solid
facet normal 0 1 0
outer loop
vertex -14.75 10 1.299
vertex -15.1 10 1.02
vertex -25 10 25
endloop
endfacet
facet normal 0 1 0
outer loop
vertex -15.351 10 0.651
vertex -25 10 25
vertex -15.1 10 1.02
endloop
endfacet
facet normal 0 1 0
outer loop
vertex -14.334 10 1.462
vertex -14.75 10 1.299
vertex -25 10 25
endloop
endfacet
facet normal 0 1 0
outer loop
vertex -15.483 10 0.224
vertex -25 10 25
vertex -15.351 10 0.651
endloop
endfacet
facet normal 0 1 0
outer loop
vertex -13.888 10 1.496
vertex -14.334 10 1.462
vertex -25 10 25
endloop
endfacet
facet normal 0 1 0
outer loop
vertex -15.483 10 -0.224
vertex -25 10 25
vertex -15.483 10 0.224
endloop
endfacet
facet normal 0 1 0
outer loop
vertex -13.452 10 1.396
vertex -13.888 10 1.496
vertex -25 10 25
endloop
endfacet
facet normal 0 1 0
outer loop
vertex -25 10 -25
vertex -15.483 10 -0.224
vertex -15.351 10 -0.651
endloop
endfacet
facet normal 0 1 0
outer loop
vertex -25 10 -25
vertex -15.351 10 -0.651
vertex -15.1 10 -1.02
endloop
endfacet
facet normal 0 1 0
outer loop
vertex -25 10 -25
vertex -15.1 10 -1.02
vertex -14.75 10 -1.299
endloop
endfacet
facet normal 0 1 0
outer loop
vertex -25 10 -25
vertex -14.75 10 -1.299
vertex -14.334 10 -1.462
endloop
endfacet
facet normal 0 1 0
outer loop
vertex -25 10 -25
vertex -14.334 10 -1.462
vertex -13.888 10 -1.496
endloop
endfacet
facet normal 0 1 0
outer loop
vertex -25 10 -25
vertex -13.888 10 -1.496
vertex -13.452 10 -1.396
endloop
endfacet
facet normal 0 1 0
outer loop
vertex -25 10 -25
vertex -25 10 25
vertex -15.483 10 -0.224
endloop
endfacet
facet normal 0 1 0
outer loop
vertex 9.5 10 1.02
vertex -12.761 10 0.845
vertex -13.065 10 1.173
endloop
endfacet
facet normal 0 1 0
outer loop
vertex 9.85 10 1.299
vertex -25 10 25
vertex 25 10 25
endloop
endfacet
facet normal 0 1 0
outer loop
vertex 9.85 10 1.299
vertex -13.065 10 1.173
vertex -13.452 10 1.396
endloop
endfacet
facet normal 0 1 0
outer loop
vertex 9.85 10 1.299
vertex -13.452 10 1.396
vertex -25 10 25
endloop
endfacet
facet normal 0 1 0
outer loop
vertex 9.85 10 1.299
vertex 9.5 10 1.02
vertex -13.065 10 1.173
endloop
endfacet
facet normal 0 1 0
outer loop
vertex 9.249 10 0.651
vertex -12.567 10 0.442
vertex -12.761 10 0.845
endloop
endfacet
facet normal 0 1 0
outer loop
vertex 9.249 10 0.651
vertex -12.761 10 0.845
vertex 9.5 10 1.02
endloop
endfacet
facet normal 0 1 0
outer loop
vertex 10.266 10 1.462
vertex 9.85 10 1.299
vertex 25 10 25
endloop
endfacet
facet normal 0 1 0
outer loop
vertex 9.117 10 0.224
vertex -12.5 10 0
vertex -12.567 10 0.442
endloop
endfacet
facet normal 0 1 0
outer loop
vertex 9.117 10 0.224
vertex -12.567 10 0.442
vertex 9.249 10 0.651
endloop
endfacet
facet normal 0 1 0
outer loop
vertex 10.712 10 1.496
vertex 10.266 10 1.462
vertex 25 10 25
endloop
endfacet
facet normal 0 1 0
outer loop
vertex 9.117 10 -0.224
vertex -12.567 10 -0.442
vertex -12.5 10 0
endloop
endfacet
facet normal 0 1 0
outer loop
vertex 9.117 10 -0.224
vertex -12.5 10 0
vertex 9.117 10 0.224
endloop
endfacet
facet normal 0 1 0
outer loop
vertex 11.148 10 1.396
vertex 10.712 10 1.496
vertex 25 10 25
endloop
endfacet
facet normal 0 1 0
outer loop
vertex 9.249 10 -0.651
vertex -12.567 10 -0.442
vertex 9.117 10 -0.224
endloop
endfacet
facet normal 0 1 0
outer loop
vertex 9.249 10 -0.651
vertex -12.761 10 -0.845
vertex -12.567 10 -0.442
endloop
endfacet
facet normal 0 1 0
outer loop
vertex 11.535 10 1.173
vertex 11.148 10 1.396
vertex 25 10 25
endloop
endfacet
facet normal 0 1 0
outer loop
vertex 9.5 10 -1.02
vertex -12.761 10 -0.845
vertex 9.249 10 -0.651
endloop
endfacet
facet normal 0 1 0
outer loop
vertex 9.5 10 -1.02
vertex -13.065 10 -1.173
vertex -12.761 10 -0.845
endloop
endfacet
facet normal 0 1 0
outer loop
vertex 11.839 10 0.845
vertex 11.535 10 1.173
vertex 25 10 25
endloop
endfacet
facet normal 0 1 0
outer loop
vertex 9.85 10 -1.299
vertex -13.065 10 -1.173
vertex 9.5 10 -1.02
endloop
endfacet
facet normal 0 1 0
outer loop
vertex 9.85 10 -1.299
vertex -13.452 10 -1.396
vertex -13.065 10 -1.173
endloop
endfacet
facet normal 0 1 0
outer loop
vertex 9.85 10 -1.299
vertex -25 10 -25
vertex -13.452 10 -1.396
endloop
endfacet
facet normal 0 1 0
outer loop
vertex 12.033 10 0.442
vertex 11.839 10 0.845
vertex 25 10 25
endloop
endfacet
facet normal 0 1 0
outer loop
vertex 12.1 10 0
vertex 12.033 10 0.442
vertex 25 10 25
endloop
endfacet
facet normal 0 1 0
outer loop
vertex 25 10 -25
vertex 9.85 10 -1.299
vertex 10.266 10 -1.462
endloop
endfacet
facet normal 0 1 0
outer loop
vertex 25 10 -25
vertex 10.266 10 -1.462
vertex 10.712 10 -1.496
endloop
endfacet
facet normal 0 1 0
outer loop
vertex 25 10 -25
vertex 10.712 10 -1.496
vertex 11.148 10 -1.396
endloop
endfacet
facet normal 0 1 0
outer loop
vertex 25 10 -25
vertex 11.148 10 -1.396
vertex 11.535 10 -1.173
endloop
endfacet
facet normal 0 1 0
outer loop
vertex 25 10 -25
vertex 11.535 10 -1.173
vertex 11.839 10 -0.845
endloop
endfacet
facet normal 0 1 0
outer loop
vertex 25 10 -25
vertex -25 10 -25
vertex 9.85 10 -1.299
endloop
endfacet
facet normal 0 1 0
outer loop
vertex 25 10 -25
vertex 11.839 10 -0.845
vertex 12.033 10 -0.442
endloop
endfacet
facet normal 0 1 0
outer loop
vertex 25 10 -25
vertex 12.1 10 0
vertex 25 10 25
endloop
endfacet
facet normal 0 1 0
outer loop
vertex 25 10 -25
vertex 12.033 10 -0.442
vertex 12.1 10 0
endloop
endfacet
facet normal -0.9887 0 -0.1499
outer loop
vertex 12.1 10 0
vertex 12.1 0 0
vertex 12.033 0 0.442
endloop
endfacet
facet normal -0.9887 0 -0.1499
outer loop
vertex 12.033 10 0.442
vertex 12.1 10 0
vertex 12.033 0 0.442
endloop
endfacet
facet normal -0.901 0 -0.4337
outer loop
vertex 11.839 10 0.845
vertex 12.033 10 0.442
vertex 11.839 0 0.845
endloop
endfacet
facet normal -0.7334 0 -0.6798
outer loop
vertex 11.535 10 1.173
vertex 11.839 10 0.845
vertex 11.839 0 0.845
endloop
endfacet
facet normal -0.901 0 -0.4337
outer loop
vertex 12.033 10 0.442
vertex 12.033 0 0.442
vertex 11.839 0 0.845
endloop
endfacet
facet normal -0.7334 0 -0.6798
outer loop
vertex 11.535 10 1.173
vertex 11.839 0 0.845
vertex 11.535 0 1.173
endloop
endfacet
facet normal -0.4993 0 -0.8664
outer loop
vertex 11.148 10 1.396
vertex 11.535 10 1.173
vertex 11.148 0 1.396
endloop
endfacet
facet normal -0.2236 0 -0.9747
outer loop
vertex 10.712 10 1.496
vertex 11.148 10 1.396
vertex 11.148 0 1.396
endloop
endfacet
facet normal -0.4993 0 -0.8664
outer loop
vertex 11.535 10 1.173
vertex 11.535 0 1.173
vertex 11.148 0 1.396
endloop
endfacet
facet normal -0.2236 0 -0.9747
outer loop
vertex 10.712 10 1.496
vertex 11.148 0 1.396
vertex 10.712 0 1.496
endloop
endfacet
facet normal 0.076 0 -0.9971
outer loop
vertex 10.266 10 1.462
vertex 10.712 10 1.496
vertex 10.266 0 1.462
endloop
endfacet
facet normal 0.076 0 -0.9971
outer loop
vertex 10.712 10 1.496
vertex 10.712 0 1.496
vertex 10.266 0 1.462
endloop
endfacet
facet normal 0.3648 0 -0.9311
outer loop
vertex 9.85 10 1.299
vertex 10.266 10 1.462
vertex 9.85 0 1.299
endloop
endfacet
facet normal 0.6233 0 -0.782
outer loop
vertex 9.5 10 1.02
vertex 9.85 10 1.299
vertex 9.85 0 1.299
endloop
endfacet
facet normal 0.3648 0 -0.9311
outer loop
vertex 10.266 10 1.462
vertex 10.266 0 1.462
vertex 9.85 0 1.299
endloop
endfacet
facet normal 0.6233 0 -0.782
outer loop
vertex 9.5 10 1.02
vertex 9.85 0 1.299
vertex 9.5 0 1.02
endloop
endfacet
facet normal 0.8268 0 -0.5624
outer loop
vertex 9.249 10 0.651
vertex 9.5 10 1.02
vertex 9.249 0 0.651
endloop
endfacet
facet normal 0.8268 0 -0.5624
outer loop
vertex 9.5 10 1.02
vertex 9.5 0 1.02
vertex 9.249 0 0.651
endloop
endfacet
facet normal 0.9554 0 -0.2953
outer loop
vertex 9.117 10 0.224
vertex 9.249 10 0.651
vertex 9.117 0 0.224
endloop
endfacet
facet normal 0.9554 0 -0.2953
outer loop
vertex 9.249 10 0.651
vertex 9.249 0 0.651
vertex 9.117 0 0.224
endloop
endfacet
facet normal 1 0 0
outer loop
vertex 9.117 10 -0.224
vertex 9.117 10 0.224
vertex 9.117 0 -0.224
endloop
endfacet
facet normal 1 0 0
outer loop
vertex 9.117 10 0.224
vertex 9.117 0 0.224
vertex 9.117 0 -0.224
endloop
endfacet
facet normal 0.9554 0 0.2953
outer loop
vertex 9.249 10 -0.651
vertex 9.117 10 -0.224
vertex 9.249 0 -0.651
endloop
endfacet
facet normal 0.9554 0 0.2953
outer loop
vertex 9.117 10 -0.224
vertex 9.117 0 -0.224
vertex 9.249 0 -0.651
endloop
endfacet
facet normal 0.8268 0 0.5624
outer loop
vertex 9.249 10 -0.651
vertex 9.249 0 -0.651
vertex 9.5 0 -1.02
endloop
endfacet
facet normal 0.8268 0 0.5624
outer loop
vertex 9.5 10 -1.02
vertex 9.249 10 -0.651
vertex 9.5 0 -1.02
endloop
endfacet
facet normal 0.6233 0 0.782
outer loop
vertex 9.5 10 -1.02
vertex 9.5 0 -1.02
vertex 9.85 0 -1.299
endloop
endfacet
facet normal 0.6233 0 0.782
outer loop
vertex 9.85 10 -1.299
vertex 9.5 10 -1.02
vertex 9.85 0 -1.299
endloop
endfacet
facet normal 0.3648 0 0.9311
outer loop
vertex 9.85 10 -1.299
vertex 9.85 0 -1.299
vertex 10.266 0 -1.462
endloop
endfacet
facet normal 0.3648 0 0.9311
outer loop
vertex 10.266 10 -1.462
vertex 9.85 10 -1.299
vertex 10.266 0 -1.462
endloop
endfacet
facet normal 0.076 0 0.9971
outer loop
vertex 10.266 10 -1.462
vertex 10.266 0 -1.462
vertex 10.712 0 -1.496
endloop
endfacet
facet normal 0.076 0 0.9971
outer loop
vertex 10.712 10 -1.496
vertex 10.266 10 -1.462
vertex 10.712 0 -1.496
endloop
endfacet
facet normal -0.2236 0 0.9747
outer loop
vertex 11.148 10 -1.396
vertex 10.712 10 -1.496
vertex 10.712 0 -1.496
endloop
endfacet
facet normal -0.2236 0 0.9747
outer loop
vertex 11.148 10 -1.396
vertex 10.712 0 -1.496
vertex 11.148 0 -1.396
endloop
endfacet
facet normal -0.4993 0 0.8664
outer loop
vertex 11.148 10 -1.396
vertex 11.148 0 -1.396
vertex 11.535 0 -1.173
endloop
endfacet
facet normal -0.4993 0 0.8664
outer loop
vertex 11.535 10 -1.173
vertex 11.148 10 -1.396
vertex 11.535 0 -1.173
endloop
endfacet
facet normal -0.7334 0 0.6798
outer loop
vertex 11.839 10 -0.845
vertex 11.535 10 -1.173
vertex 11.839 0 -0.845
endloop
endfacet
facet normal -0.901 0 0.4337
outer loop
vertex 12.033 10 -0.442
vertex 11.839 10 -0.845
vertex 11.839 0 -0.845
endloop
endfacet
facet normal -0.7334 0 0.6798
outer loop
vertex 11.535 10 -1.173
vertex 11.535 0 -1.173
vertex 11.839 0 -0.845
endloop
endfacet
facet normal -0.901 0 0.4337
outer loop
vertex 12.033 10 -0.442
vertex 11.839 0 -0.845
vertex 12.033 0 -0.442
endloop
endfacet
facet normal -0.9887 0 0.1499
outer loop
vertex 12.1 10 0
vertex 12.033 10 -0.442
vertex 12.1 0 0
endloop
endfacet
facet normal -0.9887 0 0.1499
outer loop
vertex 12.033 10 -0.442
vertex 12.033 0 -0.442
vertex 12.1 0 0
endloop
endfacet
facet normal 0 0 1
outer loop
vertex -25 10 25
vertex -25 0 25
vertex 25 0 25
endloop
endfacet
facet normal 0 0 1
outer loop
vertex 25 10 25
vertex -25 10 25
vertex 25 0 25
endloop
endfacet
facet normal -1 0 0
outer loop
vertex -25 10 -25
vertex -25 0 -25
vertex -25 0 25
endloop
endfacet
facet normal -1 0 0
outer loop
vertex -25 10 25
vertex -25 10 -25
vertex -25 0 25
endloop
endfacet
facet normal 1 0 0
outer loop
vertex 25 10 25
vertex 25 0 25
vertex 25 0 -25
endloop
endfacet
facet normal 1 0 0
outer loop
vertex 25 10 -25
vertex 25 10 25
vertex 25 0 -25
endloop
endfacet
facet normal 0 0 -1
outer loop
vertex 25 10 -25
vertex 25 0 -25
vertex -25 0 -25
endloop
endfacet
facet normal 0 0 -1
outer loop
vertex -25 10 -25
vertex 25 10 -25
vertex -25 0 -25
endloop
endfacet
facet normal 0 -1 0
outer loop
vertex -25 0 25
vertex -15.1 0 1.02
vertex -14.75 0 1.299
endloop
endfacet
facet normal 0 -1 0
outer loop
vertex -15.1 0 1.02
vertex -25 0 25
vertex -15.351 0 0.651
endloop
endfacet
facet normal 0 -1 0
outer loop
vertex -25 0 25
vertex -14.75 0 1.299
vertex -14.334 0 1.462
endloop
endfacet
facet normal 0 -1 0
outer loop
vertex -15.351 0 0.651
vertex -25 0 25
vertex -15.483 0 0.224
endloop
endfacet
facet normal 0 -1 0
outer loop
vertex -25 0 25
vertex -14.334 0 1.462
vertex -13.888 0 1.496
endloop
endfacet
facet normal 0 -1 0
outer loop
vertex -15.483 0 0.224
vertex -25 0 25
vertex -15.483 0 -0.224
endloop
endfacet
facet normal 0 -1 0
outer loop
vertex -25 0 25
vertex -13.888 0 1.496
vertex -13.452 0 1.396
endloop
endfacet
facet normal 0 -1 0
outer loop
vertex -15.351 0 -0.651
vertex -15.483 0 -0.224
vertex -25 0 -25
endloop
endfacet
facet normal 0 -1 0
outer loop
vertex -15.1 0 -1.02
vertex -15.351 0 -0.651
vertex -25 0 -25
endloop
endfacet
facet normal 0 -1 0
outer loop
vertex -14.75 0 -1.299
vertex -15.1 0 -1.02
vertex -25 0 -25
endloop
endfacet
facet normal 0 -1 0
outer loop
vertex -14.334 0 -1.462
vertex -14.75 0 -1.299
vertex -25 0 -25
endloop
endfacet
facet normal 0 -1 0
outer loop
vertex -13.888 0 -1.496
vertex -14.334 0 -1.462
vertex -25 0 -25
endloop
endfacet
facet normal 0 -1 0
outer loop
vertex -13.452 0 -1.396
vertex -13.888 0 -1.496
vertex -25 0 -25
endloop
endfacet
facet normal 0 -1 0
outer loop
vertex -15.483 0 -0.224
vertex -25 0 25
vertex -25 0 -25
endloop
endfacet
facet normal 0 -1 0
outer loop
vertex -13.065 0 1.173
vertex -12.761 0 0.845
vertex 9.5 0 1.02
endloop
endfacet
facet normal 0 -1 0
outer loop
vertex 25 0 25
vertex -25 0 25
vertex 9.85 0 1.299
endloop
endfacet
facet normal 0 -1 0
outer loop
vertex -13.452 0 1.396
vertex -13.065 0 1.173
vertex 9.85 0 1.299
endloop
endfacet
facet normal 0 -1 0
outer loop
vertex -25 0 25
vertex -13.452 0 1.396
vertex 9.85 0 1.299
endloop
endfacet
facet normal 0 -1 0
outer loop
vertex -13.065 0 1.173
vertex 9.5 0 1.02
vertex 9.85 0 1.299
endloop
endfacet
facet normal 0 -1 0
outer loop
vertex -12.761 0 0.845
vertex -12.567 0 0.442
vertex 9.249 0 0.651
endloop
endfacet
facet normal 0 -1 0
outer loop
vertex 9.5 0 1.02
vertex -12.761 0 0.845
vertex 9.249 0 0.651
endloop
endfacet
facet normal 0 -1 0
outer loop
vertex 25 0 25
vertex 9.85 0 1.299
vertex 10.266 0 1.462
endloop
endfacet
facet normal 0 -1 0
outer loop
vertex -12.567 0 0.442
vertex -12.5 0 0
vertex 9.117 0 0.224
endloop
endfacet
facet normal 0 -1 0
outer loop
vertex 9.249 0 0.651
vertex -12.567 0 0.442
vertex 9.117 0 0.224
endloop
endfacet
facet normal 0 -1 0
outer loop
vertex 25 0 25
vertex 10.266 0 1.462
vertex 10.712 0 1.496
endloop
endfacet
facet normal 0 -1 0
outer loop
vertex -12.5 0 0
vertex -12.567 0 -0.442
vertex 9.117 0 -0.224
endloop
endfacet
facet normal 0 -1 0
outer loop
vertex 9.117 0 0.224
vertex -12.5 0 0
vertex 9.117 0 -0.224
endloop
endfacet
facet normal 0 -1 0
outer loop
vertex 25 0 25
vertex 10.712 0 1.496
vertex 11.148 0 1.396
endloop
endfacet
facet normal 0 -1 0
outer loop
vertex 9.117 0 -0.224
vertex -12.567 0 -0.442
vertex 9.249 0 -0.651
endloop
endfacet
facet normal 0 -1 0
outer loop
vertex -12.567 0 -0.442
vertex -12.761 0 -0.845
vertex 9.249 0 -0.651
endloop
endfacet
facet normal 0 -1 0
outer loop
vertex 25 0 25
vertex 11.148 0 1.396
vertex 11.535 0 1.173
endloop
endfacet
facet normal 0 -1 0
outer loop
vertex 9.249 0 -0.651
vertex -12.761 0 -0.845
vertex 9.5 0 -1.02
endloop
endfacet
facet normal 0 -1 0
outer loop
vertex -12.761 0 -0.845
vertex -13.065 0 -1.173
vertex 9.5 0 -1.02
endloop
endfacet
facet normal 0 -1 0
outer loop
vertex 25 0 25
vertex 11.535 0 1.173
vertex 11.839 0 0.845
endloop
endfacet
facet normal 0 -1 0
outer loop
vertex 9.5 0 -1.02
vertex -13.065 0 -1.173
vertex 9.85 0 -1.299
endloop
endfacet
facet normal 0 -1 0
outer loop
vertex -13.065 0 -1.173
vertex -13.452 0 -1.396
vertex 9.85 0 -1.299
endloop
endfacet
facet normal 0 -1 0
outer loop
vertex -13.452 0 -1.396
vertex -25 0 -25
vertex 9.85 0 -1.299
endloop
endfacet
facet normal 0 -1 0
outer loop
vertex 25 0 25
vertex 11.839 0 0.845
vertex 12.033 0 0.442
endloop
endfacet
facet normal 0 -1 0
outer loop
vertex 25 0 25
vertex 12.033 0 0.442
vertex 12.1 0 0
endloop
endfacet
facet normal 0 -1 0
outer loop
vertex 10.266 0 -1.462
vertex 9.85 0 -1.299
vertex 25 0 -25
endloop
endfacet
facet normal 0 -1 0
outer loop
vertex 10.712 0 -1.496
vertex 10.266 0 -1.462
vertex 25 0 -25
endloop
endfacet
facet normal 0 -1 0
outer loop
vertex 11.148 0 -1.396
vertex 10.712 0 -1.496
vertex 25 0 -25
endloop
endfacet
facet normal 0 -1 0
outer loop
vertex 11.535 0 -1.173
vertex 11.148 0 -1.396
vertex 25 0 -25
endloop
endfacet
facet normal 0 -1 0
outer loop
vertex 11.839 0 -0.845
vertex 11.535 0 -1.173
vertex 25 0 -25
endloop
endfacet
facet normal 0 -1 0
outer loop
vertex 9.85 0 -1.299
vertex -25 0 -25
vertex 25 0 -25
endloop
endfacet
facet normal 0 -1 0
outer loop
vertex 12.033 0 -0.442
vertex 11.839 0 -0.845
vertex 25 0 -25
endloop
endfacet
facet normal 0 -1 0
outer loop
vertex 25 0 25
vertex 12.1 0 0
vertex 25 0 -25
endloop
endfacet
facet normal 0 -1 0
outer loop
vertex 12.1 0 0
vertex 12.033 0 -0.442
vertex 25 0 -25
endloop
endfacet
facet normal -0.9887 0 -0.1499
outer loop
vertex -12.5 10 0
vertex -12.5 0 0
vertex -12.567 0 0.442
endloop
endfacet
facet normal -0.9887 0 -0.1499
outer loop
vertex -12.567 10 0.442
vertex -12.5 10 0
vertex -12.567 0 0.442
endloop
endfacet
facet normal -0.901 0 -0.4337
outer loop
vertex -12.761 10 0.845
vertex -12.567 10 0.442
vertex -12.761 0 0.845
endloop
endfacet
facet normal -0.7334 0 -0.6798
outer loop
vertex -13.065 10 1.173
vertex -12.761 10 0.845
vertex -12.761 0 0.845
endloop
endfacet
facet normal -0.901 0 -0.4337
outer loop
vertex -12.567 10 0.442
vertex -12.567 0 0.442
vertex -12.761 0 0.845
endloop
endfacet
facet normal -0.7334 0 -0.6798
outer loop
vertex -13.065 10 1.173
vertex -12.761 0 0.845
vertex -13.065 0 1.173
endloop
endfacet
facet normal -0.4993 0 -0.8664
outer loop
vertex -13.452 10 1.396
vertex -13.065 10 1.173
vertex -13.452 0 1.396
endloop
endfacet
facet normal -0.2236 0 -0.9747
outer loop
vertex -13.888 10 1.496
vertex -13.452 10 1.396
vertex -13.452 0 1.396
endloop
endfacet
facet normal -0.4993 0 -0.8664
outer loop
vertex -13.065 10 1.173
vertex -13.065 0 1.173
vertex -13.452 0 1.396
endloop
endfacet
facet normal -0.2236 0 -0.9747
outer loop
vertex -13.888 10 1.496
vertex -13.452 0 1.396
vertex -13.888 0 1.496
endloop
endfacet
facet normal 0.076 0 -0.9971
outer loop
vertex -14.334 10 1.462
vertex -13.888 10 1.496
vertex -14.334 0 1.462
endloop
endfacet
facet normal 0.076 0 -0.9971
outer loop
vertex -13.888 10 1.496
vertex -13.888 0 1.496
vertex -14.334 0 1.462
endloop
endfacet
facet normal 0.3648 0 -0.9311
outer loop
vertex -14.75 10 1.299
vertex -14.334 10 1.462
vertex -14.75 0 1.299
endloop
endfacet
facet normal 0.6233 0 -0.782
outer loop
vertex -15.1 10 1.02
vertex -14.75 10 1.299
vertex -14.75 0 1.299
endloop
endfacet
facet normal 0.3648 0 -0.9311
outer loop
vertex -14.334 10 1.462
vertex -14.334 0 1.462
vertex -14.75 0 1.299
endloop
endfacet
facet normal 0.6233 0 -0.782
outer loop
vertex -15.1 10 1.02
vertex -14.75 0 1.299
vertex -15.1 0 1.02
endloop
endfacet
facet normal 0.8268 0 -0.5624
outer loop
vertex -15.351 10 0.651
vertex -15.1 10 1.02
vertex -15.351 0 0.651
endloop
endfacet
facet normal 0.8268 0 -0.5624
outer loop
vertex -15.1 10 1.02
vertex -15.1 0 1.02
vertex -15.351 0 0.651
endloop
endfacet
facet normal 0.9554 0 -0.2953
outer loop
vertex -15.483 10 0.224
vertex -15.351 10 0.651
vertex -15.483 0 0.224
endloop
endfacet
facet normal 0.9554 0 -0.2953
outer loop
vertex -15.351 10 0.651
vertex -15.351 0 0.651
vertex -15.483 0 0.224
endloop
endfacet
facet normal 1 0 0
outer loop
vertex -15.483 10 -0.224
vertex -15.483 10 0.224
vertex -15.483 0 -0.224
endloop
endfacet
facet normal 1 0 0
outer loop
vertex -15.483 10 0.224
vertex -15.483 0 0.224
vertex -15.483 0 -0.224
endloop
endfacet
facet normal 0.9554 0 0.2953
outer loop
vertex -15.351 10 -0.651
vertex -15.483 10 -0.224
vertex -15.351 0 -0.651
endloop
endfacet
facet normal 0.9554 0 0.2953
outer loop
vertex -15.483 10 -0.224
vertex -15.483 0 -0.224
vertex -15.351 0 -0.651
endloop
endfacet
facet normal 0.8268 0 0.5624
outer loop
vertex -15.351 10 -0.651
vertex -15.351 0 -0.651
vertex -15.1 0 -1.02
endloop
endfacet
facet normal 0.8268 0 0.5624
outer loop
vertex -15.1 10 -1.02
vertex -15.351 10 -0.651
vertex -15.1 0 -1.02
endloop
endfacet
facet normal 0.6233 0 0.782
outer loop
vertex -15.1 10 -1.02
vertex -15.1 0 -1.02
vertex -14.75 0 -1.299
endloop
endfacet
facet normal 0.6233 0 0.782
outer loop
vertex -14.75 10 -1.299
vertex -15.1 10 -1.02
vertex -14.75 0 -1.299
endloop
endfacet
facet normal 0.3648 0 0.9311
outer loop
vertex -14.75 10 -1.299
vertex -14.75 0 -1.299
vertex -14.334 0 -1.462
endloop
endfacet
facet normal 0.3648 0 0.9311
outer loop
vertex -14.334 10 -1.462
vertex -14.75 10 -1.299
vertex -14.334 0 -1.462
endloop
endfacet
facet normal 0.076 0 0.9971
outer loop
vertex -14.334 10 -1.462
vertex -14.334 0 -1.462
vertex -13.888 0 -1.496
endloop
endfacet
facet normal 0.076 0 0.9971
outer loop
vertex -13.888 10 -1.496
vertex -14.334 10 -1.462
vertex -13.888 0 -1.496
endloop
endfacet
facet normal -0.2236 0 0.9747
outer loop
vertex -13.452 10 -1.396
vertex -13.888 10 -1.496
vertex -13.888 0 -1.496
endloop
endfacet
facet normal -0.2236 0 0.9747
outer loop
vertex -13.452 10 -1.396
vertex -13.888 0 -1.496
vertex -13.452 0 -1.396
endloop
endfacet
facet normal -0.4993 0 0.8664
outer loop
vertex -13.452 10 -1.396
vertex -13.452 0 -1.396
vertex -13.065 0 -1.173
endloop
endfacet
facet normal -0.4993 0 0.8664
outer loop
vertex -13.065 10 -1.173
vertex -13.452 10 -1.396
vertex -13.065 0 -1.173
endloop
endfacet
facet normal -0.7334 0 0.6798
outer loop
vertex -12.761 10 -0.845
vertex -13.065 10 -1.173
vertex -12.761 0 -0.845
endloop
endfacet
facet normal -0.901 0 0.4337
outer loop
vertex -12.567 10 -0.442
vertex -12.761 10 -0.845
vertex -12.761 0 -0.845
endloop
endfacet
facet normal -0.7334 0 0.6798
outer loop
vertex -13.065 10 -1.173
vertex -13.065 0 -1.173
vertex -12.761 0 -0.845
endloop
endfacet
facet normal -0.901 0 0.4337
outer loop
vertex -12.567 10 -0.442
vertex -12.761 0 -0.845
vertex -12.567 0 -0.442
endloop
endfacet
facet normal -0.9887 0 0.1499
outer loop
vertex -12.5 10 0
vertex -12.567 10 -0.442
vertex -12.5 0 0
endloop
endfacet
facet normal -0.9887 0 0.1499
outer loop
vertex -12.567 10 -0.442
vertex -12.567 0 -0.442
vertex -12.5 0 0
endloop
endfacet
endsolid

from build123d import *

# Parameters (mm, degrees)
EXTRUDE_1_DEPTH = 10


with BuildPart() as part:
    # ｽｹｯﾁ1 → ﾎﾞｽ - 押し出し1 (new body)
    with BuildSketch(Plane(origin=(0, 0, 0), x_dir=(1, 0, 0), z_dir=(0, 1, 0))):
        with BuildLine():
            ThreePointArc((9.1, 0), (10.6, 1.5), (12.1, 0))
            Line((12.1, 0), (25, 0))
            Line((25, 0), (25, 25))
            Line((25, 25), (-25, 25))
            Line((-25, 25), (-25, 0))
            Line((-25, 0), (-15.5, 0))
            ThreePointArc((-15.5, 0), (-14, 1.5), (-12.5, 0))
            Line((-12.5, 0), (0, 0))
            Line((0, 0), (9.1, 0))
        make_face()
        with BuildLine():
            Line((25, 0), (12.1, 0))
            ThreePointArc((12.1, 0), (10.6, -1.5), (9.1, 0))
            Line((9.1, 0), (0, 0))
            Line((0, 0), (-12.5, 0))
            ThreePointArc((-12.5, 0), (-14, -1.5), (-15.5, 0))
            Line((-15.5, 0), (-25, 0))
            Line((-25, 0), (-25, -25))
            Line((-25, -25), (25, -25))
            Line((25, -25), (25, 0))
        make_face()
    extrude(amount=EXTRUDE_1_DEPTH)


solid = part.part
